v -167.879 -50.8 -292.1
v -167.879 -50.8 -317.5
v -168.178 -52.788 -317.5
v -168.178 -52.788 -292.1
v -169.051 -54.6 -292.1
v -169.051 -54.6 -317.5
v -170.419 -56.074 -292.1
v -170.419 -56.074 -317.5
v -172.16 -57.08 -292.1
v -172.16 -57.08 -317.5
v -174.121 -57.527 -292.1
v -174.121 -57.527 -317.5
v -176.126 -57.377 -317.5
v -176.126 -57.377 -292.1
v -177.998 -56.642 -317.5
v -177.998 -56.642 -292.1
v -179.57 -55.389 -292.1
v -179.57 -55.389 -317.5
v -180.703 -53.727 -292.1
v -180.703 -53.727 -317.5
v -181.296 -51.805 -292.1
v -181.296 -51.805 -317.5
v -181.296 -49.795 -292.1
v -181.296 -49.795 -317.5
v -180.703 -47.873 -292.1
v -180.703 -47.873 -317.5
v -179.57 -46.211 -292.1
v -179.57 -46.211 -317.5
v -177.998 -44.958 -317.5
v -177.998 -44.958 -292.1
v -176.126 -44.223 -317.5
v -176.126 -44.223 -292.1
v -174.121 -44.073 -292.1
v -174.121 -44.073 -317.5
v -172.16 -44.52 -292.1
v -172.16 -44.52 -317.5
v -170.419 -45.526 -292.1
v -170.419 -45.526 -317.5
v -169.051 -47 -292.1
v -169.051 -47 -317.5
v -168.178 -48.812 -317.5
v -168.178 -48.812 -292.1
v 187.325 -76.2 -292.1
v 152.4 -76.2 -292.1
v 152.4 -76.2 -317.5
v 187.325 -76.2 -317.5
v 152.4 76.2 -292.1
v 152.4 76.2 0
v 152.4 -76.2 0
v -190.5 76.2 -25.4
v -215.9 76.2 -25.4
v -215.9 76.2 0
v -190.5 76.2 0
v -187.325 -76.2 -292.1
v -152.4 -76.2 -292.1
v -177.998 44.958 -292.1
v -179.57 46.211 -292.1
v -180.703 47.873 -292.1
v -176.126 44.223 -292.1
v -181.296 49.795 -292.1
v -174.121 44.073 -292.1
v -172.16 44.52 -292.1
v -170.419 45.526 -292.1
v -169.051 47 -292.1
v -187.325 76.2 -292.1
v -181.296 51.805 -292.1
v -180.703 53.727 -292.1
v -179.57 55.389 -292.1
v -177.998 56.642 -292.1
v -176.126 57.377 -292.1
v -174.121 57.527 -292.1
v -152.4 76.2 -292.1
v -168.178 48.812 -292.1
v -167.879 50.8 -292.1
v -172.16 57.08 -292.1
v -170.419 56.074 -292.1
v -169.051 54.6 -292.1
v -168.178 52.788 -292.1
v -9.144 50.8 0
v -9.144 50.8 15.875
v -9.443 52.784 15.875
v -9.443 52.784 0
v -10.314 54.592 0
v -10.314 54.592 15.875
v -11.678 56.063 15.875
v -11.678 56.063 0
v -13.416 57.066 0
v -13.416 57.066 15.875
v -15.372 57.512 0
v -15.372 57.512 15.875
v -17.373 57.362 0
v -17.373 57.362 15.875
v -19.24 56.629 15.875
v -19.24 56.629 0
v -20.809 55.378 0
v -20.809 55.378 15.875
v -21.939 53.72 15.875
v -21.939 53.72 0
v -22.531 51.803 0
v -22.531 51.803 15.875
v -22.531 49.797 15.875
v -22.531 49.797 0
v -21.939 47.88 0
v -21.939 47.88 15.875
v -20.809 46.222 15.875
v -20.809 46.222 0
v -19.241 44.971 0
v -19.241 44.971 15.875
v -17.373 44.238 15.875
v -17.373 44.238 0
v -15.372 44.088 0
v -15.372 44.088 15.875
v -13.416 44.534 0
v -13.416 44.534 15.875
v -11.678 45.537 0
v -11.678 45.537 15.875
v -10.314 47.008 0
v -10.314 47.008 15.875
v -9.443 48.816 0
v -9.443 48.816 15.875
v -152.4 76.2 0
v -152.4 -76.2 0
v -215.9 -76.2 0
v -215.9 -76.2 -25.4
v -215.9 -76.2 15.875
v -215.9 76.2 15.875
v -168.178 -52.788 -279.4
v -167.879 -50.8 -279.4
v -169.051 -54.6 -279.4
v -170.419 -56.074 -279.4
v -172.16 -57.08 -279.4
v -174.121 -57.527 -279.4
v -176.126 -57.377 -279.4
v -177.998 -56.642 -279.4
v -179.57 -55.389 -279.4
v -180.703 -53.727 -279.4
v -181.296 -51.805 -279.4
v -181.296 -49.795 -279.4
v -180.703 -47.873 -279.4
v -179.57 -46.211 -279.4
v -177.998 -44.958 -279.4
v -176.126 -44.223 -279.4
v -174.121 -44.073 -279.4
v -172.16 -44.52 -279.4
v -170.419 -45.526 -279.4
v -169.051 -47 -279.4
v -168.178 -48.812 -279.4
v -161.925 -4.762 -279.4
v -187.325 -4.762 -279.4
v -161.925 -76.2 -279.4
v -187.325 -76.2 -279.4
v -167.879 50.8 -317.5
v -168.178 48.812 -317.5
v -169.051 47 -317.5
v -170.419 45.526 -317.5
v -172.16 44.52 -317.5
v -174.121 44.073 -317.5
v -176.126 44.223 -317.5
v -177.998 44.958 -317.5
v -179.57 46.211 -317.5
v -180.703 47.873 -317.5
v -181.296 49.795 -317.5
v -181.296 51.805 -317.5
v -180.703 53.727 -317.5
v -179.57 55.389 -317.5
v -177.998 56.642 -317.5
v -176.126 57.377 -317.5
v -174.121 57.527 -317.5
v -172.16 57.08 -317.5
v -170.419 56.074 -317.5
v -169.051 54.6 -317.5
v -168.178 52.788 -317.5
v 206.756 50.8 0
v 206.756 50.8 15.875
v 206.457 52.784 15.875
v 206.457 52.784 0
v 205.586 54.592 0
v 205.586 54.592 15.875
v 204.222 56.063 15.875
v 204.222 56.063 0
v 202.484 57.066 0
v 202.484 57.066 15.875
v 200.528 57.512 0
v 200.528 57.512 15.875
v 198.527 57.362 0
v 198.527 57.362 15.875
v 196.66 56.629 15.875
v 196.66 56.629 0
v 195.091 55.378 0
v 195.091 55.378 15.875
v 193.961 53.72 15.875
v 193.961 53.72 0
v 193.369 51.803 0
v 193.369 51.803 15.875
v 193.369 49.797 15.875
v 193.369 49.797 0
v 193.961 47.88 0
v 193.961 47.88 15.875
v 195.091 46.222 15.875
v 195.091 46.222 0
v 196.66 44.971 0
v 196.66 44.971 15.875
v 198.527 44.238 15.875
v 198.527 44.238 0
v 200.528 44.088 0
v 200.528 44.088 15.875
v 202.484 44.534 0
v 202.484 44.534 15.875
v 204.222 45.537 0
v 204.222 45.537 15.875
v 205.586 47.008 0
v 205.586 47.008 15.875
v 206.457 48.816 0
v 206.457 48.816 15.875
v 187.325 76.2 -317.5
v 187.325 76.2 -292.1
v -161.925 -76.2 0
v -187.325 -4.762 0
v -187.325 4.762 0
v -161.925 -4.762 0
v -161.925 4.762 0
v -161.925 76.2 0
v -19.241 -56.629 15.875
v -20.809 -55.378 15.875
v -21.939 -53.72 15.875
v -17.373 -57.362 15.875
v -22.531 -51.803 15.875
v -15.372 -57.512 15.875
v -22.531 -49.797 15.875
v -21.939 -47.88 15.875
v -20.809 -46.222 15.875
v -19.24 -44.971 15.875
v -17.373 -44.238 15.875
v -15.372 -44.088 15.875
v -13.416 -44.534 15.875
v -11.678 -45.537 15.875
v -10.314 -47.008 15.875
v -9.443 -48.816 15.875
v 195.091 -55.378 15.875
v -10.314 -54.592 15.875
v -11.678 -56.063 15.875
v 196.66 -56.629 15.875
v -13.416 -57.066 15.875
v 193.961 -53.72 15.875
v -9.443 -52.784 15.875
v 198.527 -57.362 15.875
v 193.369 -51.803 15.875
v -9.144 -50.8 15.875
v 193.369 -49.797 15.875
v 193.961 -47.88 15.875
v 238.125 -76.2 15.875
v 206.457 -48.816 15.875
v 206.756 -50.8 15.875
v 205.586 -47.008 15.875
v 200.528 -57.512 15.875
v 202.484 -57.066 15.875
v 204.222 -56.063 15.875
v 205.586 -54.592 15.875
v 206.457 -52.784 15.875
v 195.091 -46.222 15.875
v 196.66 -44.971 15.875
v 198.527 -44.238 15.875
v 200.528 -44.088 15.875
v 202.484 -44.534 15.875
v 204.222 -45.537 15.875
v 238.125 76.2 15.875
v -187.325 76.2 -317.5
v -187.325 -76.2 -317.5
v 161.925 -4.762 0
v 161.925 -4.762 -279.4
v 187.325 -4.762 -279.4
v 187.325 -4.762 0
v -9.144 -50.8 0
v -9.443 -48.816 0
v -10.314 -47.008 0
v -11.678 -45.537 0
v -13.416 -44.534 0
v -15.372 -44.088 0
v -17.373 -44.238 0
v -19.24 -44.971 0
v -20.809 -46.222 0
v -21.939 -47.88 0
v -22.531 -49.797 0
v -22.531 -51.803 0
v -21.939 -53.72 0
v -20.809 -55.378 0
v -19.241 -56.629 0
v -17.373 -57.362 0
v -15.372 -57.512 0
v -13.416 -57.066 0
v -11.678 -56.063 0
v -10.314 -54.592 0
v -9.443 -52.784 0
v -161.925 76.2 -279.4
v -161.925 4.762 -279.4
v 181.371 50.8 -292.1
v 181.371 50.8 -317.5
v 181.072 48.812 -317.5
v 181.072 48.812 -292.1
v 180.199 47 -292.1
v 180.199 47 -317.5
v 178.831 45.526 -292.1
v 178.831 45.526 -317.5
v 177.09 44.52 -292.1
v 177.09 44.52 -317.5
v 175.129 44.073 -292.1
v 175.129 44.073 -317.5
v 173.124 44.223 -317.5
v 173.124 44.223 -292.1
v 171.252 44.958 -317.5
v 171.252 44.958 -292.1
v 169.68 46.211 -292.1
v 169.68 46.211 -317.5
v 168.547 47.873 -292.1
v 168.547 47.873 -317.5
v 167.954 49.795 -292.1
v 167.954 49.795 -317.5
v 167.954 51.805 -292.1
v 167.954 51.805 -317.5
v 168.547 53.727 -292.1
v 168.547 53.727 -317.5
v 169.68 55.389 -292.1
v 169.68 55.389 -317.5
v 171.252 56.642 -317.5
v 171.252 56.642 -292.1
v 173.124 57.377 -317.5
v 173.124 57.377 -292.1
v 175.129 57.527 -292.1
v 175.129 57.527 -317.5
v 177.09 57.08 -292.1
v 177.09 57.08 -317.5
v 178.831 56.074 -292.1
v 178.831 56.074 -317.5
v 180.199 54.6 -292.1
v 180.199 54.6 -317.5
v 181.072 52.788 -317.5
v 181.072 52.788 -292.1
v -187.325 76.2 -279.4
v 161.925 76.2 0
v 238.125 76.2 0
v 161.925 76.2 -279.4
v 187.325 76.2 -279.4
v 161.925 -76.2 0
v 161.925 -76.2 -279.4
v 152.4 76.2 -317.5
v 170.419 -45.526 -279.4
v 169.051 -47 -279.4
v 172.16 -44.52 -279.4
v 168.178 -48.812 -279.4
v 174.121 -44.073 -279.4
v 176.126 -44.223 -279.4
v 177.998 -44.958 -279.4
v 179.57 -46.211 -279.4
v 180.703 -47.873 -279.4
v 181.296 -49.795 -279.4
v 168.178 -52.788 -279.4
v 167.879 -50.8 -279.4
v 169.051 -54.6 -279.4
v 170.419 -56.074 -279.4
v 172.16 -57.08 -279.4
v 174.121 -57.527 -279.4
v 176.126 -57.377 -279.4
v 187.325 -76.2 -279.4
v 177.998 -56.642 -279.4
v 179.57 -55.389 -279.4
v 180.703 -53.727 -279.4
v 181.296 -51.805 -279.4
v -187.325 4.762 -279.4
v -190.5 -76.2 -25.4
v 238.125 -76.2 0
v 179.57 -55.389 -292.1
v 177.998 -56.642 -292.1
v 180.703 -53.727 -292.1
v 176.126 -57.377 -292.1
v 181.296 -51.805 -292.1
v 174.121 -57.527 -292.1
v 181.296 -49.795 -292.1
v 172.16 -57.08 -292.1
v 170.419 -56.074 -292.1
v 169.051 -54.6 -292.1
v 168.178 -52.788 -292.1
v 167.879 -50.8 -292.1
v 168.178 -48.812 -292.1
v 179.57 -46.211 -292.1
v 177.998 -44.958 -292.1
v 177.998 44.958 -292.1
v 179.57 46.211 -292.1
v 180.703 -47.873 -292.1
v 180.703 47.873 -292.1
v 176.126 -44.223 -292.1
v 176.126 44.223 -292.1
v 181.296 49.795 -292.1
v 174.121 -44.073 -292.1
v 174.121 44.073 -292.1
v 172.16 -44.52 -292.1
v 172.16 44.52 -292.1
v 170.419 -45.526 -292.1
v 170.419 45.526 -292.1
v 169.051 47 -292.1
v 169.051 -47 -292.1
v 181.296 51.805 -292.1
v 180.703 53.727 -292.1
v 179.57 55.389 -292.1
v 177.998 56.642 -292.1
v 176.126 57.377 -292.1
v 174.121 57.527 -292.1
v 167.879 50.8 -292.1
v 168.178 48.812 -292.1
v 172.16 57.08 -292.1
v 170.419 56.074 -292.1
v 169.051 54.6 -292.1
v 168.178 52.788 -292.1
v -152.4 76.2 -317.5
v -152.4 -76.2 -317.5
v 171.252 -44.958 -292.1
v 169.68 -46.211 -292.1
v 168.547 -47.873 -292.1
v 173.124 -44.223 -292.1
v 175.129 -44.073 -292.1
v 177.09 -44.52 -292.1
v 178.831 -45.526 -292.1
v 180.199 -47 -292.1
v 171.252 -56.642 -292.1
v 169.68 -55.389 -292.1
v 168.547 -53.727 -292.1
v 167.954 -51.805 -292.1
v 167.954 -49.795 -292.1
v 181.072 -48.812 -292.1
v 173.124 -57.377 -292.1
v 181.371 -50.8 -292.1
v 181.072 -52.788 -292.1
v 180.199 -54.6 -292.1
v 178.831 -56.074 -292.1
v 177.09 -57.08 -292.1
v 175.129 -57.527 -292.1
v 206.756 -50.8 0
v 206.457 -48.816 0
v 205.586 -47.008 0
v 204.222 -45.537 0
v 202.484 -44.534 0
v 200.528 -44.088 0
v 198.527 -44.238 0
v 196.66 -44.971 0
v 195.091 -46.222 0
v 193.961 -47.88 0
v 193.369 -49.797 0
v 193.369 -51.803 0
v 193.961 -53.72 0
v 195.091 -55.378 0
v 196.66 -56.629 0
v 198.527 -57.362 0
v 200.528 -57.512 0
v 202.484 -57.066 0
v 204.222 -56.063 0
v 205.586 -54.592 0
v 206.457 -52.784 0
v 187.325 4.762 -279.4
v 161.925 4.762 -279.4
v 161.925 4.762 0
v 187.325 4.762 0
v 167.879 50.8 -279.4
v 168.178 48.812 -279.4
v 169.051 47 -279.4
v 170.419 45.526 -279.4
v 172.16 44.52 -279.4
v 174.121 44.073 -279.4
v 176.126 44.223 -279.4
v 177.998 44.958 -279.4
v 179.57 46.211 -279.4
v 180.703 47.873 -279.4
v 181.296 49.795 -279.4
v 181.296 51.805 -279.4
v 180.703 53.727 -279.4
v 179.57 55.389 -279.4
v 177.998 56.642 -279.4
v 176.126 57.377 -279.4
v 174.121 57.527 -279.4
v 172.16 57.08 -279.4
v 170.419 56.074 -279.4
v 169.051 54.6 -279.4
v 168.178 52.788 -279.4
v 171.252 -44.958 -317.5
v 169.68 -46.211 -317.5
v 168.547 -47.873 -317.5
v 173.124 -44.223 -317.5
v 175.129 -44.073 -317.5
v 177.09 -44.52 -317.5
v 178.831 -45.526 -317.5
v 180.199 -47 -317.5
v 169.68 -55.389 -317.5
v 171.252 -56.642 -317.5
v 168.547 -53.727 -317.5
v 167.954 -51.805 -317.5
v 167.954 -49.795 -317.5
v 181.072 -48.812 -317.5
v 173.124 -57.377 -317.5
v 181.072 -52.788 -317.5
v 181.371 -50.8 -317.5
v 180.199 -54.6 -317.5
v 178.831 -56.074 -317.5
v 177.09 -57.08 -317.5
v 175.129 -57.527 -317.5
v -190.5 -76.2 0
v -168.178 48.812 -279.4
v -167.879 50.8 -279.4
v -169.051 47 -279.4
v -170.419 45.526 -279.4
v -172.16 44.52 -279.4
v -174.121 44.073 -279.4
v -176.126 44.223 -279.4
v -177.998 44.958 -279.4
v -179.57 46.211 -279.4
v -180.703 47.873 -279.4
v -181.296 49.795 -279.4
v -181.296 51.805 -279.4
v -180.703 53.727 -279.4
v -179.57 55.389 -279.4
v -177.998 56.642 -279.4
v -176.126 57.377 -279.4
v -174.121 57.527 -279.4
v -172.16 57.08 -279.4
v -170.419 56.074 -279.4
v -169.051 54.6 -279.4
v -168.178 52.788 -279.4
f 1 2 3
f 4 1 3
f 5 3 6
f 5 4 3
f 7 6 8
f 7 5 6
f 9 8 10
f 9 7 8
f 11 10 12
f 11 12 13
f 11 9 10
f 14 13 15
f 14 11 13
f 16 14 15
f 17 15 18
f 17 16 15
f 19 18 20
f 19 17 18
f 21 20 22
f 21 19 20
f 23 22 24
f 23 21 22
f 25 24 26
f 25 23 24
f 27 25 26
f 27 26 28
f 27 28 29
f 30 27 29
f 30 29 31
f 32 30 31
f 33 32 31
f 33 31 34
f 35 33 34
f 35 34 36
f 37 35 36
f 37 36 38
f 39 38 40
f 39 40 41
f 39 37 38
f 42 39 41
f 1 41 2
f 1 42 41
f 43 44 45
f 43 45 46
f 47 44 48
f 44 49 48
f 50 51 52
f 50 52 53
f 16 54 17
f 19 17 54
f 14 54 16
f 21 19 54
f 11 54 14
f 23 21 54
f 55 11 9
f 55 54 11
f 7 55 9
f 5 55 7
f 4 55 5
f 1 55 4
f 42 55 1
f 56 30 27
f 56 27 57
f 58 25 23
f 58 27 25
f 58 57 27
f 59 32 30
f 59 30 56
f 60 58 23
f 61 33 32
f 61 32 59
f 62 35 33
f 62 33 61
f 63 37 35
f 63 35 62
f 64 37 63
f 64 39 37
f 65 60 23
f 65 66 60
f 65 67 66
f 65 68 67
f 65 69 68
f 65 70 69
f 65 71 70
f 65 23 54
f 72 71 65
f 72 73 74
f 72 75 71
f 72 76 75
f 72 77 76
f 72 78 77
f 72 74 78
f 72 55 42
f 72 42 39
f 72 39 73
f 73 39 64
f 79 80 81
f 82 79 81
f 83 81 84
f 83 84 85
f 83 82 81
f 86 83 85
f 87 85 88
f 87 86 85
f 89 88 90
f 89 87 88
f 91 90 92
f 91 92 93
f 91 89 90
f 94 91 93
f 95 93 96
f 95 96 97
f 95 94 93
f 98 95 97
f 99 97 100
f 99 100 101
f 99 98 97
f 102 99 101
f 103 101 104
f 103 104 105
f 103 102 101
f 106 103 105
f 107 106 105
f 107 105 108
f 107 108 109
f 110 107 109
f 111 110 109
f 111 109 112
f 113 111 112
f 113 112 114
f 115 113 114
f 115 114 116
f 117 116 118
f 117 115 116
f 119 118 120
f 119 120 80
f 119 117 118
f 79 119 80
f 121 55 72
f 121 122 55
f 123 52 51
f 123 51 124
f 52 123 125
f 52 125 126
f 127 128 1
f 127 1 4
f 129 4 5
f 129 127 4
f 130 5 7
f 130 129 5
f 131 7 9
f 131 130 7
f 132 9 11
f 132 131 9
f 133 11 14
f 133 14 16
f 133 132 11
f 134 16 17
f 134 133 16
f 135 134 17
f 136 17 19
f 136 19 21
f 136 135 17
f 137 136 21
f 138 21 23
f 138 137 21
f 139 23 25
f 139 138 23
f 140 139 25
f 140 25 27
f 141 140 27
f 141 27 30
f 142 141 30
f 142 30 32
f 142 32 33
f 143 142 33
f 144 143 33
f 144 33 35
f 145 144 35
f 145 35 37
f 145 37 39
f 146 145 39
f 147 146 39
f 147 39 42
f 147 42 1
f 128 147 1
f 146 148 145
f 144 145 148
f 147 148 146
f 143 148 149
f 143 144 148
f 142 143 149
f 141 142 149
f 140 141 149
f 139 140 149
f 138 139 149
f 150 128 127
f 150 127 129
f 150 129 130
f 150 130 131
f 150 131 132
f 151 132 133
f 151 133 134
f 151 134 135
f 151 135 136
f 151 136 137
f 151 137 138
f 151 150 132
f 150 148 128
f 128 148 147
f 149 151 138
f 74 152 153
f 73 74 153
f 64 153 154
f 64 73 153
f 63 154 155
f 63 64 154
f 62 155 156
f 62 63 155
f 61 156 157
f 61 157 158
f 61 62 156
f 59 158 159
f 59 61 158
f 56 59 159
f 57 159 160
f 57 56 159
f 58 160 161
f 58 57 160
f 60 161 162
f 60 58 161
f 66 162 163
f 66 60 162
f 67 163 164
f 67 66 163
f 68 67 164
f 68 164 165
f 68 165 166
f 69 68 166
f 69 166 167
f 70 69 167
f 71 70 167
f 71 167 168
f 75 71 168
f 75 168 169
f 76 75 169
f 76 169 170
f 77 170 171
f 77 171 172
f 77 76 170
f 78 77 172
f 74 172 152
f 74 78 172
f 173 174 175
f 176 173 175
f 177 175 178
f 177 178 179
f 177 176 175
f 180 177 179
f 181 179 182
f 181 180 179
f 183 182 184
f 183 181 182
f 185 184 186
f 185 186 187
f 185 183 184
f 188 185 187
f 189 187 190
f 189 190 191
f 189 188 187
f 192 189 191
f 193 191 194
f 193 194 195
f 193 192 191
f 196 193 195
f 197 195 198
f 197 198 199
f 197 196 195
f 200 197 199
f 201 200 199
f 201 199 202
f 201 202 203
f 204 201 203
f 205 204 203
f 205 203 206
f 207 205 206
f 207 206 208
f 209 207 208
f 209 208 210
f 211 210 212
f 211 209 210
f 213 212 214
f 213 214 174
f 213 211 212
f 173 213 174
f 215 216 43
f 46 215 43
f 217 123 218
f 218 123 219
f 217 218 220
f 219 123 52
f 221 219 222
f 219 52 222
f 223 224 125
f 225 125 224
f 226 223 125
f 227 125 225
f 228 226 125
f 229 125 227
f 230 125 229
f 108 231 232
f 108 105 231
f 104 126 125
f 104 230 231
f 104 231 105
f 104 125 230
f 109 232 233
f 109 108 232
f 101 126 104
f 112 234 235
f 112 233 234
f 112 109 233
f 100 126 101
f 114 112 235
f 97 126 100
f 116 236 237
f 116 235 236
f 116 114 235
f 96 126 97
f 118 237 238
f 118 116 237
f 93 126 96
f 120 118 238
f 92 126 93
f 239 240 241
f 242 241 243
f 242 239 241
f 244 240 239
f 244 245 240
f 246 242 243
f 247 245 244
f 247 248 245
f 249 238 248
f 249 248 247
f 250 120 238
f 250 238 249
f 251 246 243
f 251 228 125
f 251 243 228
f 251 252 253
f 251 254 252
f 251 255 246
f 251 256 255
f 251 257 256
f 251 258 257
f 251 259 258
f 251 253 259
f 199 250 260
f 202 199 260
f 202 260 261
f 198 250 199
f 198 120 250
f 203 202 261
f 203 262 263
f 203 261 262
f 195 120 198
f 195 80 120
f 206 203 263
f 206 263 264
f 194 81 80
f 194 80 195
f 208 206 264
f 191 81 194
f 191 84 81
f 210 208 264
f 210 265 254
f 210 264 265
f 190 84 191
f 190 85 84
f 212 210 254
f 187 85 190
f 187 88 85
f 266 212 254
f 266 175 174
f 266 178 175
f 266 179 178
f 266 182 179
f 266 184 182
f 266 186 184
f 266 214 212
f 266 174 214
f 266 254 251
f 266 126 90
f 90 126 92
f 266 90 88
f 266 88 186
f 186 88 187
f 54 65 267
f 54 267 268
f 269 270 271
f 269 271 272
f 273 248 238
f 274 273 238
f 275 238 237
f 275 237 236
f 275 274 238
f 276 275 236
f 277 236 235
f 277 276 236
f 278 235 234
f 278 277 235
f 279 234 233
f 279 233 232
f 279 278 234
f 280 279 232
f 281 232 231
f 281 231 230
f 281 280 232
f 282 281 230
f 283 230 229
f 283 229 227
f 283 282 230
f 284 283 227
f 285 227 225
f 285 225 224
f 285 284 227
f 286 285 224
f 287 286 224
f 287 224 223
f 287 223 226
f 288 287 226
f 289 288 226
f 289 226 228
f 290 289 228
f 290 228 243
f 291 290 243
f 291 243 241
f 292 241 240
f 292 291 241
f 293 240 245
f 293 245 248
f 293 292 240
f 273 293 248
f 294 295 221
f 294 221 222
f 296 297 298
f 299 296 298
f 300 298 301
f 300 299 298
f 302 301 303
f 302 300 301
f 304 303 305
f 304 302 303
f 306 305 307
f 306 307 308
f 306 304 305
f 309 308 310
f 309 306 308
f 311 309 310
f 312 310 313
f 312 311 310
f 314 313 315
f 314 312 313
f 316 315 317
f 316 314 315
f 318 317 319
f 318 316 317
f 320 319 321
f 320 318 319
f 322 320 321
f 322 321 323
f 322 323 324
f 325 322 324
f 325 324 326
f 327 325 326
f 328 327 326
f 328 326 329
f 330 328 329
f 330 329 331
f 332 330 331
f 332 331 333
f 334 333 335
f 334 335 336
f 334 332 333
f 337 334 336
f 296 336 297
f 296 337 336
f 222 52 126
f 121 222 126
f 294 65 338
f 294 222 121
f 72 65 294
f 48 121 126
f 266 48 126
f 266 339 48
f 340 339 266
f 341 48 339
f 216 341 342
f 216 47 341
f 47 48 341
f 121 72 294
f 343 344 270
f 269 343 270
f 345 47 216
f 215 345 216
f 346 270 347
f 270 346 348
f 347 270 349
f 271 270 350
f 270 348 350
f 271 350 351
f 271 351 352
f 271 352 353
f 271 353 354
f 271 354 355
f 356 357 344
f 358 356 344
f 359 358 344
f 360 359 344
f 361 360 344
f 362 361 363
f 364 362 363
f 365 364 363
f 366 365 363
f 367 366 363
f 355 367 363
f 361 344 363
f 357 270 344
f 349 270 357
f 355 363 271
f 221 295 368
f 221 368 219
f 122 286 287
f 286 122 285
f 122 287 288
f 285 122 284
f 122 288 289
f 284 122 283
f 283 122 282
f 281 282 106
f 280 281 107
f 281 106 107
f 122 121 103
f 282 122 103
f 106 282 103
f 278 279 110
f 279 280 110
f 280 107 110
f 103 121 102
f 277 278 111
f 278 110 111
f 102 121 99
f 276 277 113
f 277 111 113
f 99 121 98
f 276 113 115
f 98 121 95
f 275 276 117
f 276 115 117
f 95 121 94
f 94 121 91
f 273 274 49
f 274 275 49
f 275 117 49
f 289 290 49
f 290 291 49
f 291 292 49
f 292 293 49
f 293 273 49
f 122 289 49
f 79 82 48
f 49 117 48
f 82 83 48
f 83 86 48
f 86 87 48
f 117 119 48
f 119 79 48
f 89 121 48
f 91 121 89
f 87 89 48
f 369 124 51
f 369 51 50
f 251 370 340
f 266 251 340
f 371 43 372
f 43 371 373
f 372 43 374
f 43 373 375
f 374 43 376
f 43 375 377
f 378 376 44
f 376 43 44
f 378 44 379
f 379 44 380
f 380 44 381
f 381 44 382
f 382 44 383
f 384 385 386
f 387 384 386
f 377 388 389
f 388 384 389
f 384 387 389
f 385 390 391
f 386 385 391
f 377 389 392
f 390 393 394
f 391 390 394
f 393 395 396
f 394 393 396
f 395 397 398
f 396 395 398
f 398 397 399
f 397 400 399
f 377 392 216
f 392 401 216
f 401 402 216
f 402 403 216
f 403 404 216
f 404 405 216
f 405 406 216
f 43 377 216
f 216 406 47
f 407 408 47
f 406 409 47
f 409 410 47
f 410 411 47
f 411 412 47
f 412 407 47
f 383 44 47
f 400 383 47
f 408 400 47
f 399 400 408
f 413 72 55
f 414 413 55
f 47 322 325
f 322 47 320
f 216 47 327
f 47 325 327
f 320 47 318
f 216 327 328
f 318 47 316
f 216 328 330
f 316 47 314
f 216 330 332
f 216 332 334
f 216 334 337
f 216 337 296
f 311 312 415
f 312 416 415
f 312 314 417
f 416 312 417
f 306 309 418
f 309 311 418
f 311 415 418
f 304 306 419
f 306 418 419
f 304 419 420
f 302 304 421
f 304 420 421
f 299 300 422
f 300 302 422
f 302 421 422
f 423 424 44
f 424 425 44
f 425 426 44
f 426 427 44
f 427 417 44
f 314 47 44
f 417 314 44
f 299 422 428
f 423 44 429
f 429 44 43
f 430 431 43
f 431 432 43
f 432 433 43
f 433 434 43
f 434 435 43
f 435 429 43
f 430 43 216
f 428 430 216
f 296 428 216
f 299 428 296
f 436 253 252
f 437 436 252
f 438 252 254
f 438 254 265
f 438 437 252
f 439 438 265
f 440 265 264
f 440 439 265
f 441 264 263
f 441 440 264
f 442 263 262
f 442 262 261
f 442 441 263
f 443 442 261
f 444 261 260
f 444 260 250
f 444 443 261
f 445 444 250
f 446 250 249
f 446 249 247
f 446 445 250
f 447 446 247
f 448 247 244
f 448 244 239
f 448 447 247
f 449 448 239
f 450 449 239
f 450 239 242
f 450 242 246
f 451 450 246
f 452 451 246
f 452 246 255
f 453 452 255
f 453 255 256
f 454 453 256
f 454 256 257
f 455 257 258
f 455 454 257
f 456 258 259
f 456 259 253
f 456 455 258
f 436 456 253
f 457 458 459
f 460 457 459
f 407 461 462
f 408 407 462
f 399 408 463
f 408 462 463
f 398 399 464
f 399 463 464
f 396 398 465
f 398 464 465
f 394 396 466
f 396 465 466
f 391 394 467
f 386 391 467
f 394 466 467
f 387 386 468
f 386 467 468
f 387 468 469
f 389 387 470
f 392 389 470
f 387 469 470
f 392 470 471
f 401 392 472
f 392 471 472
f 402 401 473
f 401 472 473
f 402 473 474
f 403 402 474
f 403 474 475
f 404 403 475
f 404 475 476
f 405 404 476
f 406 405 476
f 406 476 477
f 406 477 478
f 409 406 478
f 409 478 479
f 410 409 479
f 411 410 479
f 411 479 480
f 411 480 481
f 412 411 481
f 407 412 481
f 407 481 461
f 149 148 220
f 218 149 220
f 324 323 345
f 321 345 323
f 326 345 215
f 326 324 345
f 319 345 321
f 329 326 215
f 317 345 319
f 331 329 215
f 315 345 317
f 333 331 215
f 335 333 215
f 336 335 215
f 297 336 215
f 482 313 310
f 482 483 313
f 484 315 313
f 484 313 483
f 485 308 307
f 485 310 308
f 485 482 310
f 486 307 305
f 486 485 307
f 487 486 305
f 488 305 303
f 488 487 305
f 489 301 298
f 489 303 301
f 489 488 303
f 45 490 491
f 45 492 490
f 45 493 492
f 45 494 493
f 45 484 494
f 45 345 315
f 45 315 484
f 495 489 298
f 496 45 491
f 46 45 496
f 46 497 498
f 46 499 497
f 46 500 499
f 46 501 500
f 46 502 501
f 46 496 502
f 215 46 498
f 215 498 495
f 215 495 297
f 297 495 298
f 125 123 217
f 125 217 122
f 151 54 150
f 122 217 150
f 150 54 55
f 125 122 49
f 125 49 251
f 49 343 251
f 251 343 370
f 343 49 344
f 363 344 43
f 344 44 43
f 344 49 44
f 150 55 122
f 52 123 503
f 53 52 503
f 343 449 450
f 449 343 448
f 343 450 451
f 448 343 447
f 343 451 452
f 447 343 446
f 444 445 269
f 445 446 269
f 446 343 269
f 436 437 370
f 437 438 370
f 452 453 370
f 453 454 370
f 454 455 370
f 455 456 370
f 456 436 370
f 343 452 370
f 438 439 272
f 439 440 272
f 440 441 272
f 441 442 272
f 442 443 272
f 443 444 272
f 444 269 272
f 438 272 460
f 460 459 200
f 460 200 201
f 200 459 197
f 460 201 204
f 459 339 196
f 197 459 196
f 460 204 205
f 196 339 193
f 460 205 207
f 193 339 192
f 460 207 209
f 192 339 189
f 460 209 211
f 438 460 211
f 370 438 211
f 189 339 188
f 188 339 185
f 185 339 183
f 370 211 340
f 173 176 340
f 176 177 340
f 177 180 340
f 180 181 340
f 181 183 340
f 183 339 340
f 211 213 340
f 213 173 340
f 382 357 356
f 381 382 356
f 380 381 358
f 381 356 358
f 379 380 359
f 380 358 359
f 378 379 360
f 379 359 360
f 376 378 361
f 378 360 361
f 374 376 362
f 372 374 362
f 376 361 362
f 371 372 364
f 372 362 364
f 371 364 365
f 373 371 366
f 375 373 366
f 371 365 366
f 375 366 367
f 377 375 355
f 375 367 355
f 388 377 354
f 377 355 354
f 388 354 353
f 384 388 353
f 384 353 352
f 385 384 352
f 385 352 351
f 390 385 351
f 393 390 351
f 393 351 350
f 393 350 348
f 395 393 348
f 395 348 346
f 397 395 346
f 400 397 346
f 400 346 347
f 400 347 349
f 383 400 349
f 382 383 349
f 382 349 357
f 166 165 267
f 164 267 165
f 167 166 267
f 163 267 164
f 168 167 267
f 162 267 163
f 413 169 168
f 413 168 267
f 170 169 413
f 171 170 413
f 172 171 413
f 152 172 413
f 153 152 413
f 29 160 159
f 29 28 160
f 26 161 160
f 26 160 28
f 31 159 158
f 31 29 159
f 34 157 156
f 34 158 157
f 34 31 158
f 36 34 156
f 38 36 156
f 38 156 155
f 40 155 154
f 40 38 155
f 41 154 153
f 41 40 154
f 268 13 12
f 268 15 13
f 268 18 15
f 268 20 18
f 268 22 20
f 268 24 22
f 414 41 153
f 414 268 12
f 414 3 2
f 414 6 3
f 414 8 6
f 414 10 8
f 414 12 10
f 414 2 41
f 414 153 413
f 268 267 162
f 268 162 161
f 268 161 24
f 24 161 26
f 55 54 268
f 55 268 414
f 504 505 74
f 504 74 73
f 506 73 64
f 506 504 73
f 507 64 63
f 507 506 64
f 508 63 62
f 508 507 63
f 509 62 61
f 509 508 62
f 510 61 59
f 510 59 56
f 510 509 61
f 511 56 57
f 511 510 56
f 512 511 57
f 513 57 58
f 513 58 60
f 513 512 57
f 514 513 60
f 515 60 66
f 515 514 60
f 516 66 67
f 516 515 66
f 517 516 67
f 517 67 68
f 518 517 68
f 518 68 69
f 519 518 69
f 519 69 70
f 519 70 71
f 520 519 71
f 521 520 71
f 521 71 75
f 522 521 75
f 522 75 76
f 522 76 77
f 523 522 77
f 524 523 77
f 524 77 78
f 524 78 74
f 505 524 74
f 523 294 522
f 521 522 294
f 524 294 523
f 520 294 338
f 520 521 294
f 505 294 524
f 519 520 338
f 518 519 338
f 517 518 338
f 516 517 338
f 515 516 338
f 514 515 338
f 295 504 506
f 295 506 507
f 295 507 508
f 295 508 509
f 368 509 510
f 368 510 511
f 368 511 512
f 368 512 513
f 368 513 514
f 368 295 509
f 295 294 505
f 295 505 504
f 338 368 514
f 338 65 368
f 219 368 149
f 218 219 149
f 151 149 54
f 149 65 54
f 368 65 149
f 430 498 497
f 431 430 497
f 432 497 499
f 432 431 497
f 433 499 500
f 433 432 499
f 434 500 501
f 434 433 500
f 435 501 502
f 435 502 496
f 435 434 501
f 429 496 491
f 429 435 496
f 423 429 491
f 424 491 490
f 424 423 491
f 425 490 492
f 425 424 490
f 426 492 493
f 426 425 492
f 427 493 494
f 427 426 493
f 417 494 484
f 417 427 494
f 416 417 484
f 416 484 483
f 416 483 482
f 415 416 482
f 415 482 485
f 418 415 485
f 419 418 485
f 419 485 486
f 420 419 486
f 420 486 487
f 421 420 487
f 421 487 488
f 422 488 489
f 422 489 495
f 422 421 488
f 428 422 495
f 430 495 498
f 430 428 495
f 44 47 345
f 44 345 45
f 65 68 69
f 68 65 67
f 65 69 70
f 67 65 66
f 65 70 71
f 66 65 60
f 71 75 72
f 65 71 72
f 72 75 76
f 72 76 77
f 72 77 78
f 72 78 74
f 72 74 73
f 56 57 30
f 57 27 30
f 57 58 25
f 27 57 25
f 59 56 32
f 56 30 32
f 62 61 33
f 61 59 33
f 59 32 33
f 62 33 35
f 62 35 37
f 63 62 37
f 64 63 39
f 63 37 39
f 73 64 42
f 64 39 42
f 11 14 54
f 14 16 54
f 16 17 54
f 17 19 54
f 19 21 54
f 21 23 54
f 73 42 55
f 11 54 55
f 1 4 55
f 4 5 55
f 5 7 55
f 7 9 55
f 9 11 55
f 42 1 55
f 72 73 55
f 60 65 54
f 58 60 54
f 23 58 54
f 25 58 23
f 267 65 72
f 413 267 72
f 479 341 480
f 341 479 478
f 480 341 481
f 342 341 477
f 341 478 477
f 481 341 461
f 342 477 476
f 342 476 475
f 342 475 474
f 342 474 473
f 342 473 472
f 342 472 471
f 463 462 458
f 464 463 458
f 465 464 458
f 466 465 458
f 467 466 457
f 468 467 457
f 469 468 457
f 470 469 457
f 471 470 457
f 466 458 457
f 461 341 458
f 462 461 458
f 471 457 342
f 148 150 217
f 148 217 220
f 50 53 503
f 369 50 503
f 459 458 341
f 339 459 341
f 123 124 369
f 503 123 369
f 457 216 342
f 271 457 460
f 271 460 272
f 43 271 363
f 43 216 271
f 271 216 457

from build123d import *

# Parameters (mm, degrees)
F0_W      = 454.025
F0_H      = 152.4
F0_R      = 6.731
F1_DEPTH  = 15.875
F2_W      = 25.4
F2_H      = 152.4
F3_DEPTH  = 25.4
F6_W      = 152.4
F6_H      = 292.1
F7_DEPTH  = 9.525
F8_W      = 34.925
F8_H      = 152.4
F9_DEPTH  = 12.7
F11_D     = 13.49248
F11_DEPTH = 25.4
F11_TIP   = 4.0535499425
F13_W     = 9.525
F13_H     = 279.4
F14_DEPTH = 25.4
F16_W     = 34.925
F16_H     = 152.4
F16_R     = 6.74624
F17_DEPTH = 25.4


with BuildPart() as f1:
    # F0 (on Top) → F1 (new body)
    with BuildSketch(Plane.XY):
        with Locations((11.1125, 0)):
            Rectangle(F0_W, F0_H)
        with Locations((-15.875, -50.8)):
            Circle(F0_R, mode=Mode.SUBTRACT)
        with Locations((200.025, -50.8)):
            Circle(F0_R, mode=Mode.SUBTRACT)
        with Locations((-15.875, 50.8)):
            Circle(F0_R, mode=Mode.SUBTRACT)
        with Locations((200.025, 50.8)):
            Circle(F0_R, mode=Mode.SUBTRACT)
    extrude(amount=F1_DEPTH)

    # F12: F7 across plane


with BuildPart() as f3:
    # F2 (on face) → F3 (new body)
    with BuildSketch(Plane(origin=(0, 0, 0), x_dir=(1, 0, 0), z_dir=(0, 0, -1))):
        with Locations((-203.2, 0)):
            Rectangle(F2_W, F2_H)
    extrude(amount=F3_DEPTH)


with BuildPart() as f7:
    # F6 (on offset) → F7 (new body)
    with BuildSketch(Plane.YZ.offset(152.4)):
        with Locations((0, -146.05)):
            Rectangle(F6_W, F6_H)
    extrude(amount=F7_DEPTH)

    # F8 (on offset) → F9 (join)
    with BuildSketch(Plane(origin=(0, 0, -292.1), x_dir=(1, 0, 0), z_dir=(0, 0, -1))):
        with Locations((169.8625, 0)):
            Rectangle(F8_W, F8_H)
    extrude(amount=-F9_DEPTH)

    # F11
    with Locations(Plane(origin=(0, 0, -292.1), x_dir=(1, 0, 0), z_dir=(0, 0, -1))):
        with Locations((174.625, 50.8), (174.625, -50.8)):
            Hole(F11_D / 2, depth=F11_DEPTH)
            with Locations((0, 0, -(F11_DEPTH + F11_TIP / 2))):  # 118° drill point
                Cone(0, F11_D / 2, F11_TIP, mode=Mode.SUBTRACT)


with BuildPart() as f1_1:
    add(f1.part)
    add(f7.part.mirror(Plane.YZ))



with BuildPart() as f14:
    # F13 (on face) → F14 (new body)
    with BuildSketch(Plane(origin=(-161.925, 0, 0), x_dir=(0, -1, 0), z_dir=(-1, 0, 0))):
        with Locations((0, -139.7)):
            Rectangle(F13_W, F13_H)
    extrude(amount=F14_DEPTH)


with BuildPart() as f1_2:
    add(f1_1.part)

    add(f7.part)  # F15 merges F7

    add(f14.part)  # F15 merges F14
    # F15: F14 across plane
    add(f14.part.mirror(Plane.YZ))


with BuildPart() as f17:
    # F16 (on face) → F17 (new body)
    with BuildSketch(Plane(origin=(0, 0, -292.1), x_dir=(1, 0, 0), z_dir=(0, 0, -1))):
        with Locations((-169.8625, 0)):
            Rectangle(F16_W, F16_H)
        with Locations((-174.625, -50.8)):
            Circle(F16_R, mode=Mode.SUBTRACT)
        with Locations((-174.625, 50.8)):
            Circle(F16_R, mode=Mode.SUBTRACT)
    extrude(amount=F17_DEPTH)


with BuildPart() as f17b:
    # F16 (on face) → F17, piece 2 (new body)
    with BuildSketch(Plane(origin=(0, 0, -292.1), x_dir=(1, 0, 0), z_dir=(0, 0, -1))):
        with Locations((169.8625, 0)):
            Rectangle(F16_W, F16_H)
        with Locations((174.625, -50.8)):
            Circle(F16_R, mode=Mode.SUBTRACT)
        with Locations((174.625, 50.8)):
            Circle(F16_R, mode=Mode.SUBTRACT)
    extrude(amount=F17_DEPTH)


solid = Compound([f3.part, f1_2.part, f17.part, f17b.part])
